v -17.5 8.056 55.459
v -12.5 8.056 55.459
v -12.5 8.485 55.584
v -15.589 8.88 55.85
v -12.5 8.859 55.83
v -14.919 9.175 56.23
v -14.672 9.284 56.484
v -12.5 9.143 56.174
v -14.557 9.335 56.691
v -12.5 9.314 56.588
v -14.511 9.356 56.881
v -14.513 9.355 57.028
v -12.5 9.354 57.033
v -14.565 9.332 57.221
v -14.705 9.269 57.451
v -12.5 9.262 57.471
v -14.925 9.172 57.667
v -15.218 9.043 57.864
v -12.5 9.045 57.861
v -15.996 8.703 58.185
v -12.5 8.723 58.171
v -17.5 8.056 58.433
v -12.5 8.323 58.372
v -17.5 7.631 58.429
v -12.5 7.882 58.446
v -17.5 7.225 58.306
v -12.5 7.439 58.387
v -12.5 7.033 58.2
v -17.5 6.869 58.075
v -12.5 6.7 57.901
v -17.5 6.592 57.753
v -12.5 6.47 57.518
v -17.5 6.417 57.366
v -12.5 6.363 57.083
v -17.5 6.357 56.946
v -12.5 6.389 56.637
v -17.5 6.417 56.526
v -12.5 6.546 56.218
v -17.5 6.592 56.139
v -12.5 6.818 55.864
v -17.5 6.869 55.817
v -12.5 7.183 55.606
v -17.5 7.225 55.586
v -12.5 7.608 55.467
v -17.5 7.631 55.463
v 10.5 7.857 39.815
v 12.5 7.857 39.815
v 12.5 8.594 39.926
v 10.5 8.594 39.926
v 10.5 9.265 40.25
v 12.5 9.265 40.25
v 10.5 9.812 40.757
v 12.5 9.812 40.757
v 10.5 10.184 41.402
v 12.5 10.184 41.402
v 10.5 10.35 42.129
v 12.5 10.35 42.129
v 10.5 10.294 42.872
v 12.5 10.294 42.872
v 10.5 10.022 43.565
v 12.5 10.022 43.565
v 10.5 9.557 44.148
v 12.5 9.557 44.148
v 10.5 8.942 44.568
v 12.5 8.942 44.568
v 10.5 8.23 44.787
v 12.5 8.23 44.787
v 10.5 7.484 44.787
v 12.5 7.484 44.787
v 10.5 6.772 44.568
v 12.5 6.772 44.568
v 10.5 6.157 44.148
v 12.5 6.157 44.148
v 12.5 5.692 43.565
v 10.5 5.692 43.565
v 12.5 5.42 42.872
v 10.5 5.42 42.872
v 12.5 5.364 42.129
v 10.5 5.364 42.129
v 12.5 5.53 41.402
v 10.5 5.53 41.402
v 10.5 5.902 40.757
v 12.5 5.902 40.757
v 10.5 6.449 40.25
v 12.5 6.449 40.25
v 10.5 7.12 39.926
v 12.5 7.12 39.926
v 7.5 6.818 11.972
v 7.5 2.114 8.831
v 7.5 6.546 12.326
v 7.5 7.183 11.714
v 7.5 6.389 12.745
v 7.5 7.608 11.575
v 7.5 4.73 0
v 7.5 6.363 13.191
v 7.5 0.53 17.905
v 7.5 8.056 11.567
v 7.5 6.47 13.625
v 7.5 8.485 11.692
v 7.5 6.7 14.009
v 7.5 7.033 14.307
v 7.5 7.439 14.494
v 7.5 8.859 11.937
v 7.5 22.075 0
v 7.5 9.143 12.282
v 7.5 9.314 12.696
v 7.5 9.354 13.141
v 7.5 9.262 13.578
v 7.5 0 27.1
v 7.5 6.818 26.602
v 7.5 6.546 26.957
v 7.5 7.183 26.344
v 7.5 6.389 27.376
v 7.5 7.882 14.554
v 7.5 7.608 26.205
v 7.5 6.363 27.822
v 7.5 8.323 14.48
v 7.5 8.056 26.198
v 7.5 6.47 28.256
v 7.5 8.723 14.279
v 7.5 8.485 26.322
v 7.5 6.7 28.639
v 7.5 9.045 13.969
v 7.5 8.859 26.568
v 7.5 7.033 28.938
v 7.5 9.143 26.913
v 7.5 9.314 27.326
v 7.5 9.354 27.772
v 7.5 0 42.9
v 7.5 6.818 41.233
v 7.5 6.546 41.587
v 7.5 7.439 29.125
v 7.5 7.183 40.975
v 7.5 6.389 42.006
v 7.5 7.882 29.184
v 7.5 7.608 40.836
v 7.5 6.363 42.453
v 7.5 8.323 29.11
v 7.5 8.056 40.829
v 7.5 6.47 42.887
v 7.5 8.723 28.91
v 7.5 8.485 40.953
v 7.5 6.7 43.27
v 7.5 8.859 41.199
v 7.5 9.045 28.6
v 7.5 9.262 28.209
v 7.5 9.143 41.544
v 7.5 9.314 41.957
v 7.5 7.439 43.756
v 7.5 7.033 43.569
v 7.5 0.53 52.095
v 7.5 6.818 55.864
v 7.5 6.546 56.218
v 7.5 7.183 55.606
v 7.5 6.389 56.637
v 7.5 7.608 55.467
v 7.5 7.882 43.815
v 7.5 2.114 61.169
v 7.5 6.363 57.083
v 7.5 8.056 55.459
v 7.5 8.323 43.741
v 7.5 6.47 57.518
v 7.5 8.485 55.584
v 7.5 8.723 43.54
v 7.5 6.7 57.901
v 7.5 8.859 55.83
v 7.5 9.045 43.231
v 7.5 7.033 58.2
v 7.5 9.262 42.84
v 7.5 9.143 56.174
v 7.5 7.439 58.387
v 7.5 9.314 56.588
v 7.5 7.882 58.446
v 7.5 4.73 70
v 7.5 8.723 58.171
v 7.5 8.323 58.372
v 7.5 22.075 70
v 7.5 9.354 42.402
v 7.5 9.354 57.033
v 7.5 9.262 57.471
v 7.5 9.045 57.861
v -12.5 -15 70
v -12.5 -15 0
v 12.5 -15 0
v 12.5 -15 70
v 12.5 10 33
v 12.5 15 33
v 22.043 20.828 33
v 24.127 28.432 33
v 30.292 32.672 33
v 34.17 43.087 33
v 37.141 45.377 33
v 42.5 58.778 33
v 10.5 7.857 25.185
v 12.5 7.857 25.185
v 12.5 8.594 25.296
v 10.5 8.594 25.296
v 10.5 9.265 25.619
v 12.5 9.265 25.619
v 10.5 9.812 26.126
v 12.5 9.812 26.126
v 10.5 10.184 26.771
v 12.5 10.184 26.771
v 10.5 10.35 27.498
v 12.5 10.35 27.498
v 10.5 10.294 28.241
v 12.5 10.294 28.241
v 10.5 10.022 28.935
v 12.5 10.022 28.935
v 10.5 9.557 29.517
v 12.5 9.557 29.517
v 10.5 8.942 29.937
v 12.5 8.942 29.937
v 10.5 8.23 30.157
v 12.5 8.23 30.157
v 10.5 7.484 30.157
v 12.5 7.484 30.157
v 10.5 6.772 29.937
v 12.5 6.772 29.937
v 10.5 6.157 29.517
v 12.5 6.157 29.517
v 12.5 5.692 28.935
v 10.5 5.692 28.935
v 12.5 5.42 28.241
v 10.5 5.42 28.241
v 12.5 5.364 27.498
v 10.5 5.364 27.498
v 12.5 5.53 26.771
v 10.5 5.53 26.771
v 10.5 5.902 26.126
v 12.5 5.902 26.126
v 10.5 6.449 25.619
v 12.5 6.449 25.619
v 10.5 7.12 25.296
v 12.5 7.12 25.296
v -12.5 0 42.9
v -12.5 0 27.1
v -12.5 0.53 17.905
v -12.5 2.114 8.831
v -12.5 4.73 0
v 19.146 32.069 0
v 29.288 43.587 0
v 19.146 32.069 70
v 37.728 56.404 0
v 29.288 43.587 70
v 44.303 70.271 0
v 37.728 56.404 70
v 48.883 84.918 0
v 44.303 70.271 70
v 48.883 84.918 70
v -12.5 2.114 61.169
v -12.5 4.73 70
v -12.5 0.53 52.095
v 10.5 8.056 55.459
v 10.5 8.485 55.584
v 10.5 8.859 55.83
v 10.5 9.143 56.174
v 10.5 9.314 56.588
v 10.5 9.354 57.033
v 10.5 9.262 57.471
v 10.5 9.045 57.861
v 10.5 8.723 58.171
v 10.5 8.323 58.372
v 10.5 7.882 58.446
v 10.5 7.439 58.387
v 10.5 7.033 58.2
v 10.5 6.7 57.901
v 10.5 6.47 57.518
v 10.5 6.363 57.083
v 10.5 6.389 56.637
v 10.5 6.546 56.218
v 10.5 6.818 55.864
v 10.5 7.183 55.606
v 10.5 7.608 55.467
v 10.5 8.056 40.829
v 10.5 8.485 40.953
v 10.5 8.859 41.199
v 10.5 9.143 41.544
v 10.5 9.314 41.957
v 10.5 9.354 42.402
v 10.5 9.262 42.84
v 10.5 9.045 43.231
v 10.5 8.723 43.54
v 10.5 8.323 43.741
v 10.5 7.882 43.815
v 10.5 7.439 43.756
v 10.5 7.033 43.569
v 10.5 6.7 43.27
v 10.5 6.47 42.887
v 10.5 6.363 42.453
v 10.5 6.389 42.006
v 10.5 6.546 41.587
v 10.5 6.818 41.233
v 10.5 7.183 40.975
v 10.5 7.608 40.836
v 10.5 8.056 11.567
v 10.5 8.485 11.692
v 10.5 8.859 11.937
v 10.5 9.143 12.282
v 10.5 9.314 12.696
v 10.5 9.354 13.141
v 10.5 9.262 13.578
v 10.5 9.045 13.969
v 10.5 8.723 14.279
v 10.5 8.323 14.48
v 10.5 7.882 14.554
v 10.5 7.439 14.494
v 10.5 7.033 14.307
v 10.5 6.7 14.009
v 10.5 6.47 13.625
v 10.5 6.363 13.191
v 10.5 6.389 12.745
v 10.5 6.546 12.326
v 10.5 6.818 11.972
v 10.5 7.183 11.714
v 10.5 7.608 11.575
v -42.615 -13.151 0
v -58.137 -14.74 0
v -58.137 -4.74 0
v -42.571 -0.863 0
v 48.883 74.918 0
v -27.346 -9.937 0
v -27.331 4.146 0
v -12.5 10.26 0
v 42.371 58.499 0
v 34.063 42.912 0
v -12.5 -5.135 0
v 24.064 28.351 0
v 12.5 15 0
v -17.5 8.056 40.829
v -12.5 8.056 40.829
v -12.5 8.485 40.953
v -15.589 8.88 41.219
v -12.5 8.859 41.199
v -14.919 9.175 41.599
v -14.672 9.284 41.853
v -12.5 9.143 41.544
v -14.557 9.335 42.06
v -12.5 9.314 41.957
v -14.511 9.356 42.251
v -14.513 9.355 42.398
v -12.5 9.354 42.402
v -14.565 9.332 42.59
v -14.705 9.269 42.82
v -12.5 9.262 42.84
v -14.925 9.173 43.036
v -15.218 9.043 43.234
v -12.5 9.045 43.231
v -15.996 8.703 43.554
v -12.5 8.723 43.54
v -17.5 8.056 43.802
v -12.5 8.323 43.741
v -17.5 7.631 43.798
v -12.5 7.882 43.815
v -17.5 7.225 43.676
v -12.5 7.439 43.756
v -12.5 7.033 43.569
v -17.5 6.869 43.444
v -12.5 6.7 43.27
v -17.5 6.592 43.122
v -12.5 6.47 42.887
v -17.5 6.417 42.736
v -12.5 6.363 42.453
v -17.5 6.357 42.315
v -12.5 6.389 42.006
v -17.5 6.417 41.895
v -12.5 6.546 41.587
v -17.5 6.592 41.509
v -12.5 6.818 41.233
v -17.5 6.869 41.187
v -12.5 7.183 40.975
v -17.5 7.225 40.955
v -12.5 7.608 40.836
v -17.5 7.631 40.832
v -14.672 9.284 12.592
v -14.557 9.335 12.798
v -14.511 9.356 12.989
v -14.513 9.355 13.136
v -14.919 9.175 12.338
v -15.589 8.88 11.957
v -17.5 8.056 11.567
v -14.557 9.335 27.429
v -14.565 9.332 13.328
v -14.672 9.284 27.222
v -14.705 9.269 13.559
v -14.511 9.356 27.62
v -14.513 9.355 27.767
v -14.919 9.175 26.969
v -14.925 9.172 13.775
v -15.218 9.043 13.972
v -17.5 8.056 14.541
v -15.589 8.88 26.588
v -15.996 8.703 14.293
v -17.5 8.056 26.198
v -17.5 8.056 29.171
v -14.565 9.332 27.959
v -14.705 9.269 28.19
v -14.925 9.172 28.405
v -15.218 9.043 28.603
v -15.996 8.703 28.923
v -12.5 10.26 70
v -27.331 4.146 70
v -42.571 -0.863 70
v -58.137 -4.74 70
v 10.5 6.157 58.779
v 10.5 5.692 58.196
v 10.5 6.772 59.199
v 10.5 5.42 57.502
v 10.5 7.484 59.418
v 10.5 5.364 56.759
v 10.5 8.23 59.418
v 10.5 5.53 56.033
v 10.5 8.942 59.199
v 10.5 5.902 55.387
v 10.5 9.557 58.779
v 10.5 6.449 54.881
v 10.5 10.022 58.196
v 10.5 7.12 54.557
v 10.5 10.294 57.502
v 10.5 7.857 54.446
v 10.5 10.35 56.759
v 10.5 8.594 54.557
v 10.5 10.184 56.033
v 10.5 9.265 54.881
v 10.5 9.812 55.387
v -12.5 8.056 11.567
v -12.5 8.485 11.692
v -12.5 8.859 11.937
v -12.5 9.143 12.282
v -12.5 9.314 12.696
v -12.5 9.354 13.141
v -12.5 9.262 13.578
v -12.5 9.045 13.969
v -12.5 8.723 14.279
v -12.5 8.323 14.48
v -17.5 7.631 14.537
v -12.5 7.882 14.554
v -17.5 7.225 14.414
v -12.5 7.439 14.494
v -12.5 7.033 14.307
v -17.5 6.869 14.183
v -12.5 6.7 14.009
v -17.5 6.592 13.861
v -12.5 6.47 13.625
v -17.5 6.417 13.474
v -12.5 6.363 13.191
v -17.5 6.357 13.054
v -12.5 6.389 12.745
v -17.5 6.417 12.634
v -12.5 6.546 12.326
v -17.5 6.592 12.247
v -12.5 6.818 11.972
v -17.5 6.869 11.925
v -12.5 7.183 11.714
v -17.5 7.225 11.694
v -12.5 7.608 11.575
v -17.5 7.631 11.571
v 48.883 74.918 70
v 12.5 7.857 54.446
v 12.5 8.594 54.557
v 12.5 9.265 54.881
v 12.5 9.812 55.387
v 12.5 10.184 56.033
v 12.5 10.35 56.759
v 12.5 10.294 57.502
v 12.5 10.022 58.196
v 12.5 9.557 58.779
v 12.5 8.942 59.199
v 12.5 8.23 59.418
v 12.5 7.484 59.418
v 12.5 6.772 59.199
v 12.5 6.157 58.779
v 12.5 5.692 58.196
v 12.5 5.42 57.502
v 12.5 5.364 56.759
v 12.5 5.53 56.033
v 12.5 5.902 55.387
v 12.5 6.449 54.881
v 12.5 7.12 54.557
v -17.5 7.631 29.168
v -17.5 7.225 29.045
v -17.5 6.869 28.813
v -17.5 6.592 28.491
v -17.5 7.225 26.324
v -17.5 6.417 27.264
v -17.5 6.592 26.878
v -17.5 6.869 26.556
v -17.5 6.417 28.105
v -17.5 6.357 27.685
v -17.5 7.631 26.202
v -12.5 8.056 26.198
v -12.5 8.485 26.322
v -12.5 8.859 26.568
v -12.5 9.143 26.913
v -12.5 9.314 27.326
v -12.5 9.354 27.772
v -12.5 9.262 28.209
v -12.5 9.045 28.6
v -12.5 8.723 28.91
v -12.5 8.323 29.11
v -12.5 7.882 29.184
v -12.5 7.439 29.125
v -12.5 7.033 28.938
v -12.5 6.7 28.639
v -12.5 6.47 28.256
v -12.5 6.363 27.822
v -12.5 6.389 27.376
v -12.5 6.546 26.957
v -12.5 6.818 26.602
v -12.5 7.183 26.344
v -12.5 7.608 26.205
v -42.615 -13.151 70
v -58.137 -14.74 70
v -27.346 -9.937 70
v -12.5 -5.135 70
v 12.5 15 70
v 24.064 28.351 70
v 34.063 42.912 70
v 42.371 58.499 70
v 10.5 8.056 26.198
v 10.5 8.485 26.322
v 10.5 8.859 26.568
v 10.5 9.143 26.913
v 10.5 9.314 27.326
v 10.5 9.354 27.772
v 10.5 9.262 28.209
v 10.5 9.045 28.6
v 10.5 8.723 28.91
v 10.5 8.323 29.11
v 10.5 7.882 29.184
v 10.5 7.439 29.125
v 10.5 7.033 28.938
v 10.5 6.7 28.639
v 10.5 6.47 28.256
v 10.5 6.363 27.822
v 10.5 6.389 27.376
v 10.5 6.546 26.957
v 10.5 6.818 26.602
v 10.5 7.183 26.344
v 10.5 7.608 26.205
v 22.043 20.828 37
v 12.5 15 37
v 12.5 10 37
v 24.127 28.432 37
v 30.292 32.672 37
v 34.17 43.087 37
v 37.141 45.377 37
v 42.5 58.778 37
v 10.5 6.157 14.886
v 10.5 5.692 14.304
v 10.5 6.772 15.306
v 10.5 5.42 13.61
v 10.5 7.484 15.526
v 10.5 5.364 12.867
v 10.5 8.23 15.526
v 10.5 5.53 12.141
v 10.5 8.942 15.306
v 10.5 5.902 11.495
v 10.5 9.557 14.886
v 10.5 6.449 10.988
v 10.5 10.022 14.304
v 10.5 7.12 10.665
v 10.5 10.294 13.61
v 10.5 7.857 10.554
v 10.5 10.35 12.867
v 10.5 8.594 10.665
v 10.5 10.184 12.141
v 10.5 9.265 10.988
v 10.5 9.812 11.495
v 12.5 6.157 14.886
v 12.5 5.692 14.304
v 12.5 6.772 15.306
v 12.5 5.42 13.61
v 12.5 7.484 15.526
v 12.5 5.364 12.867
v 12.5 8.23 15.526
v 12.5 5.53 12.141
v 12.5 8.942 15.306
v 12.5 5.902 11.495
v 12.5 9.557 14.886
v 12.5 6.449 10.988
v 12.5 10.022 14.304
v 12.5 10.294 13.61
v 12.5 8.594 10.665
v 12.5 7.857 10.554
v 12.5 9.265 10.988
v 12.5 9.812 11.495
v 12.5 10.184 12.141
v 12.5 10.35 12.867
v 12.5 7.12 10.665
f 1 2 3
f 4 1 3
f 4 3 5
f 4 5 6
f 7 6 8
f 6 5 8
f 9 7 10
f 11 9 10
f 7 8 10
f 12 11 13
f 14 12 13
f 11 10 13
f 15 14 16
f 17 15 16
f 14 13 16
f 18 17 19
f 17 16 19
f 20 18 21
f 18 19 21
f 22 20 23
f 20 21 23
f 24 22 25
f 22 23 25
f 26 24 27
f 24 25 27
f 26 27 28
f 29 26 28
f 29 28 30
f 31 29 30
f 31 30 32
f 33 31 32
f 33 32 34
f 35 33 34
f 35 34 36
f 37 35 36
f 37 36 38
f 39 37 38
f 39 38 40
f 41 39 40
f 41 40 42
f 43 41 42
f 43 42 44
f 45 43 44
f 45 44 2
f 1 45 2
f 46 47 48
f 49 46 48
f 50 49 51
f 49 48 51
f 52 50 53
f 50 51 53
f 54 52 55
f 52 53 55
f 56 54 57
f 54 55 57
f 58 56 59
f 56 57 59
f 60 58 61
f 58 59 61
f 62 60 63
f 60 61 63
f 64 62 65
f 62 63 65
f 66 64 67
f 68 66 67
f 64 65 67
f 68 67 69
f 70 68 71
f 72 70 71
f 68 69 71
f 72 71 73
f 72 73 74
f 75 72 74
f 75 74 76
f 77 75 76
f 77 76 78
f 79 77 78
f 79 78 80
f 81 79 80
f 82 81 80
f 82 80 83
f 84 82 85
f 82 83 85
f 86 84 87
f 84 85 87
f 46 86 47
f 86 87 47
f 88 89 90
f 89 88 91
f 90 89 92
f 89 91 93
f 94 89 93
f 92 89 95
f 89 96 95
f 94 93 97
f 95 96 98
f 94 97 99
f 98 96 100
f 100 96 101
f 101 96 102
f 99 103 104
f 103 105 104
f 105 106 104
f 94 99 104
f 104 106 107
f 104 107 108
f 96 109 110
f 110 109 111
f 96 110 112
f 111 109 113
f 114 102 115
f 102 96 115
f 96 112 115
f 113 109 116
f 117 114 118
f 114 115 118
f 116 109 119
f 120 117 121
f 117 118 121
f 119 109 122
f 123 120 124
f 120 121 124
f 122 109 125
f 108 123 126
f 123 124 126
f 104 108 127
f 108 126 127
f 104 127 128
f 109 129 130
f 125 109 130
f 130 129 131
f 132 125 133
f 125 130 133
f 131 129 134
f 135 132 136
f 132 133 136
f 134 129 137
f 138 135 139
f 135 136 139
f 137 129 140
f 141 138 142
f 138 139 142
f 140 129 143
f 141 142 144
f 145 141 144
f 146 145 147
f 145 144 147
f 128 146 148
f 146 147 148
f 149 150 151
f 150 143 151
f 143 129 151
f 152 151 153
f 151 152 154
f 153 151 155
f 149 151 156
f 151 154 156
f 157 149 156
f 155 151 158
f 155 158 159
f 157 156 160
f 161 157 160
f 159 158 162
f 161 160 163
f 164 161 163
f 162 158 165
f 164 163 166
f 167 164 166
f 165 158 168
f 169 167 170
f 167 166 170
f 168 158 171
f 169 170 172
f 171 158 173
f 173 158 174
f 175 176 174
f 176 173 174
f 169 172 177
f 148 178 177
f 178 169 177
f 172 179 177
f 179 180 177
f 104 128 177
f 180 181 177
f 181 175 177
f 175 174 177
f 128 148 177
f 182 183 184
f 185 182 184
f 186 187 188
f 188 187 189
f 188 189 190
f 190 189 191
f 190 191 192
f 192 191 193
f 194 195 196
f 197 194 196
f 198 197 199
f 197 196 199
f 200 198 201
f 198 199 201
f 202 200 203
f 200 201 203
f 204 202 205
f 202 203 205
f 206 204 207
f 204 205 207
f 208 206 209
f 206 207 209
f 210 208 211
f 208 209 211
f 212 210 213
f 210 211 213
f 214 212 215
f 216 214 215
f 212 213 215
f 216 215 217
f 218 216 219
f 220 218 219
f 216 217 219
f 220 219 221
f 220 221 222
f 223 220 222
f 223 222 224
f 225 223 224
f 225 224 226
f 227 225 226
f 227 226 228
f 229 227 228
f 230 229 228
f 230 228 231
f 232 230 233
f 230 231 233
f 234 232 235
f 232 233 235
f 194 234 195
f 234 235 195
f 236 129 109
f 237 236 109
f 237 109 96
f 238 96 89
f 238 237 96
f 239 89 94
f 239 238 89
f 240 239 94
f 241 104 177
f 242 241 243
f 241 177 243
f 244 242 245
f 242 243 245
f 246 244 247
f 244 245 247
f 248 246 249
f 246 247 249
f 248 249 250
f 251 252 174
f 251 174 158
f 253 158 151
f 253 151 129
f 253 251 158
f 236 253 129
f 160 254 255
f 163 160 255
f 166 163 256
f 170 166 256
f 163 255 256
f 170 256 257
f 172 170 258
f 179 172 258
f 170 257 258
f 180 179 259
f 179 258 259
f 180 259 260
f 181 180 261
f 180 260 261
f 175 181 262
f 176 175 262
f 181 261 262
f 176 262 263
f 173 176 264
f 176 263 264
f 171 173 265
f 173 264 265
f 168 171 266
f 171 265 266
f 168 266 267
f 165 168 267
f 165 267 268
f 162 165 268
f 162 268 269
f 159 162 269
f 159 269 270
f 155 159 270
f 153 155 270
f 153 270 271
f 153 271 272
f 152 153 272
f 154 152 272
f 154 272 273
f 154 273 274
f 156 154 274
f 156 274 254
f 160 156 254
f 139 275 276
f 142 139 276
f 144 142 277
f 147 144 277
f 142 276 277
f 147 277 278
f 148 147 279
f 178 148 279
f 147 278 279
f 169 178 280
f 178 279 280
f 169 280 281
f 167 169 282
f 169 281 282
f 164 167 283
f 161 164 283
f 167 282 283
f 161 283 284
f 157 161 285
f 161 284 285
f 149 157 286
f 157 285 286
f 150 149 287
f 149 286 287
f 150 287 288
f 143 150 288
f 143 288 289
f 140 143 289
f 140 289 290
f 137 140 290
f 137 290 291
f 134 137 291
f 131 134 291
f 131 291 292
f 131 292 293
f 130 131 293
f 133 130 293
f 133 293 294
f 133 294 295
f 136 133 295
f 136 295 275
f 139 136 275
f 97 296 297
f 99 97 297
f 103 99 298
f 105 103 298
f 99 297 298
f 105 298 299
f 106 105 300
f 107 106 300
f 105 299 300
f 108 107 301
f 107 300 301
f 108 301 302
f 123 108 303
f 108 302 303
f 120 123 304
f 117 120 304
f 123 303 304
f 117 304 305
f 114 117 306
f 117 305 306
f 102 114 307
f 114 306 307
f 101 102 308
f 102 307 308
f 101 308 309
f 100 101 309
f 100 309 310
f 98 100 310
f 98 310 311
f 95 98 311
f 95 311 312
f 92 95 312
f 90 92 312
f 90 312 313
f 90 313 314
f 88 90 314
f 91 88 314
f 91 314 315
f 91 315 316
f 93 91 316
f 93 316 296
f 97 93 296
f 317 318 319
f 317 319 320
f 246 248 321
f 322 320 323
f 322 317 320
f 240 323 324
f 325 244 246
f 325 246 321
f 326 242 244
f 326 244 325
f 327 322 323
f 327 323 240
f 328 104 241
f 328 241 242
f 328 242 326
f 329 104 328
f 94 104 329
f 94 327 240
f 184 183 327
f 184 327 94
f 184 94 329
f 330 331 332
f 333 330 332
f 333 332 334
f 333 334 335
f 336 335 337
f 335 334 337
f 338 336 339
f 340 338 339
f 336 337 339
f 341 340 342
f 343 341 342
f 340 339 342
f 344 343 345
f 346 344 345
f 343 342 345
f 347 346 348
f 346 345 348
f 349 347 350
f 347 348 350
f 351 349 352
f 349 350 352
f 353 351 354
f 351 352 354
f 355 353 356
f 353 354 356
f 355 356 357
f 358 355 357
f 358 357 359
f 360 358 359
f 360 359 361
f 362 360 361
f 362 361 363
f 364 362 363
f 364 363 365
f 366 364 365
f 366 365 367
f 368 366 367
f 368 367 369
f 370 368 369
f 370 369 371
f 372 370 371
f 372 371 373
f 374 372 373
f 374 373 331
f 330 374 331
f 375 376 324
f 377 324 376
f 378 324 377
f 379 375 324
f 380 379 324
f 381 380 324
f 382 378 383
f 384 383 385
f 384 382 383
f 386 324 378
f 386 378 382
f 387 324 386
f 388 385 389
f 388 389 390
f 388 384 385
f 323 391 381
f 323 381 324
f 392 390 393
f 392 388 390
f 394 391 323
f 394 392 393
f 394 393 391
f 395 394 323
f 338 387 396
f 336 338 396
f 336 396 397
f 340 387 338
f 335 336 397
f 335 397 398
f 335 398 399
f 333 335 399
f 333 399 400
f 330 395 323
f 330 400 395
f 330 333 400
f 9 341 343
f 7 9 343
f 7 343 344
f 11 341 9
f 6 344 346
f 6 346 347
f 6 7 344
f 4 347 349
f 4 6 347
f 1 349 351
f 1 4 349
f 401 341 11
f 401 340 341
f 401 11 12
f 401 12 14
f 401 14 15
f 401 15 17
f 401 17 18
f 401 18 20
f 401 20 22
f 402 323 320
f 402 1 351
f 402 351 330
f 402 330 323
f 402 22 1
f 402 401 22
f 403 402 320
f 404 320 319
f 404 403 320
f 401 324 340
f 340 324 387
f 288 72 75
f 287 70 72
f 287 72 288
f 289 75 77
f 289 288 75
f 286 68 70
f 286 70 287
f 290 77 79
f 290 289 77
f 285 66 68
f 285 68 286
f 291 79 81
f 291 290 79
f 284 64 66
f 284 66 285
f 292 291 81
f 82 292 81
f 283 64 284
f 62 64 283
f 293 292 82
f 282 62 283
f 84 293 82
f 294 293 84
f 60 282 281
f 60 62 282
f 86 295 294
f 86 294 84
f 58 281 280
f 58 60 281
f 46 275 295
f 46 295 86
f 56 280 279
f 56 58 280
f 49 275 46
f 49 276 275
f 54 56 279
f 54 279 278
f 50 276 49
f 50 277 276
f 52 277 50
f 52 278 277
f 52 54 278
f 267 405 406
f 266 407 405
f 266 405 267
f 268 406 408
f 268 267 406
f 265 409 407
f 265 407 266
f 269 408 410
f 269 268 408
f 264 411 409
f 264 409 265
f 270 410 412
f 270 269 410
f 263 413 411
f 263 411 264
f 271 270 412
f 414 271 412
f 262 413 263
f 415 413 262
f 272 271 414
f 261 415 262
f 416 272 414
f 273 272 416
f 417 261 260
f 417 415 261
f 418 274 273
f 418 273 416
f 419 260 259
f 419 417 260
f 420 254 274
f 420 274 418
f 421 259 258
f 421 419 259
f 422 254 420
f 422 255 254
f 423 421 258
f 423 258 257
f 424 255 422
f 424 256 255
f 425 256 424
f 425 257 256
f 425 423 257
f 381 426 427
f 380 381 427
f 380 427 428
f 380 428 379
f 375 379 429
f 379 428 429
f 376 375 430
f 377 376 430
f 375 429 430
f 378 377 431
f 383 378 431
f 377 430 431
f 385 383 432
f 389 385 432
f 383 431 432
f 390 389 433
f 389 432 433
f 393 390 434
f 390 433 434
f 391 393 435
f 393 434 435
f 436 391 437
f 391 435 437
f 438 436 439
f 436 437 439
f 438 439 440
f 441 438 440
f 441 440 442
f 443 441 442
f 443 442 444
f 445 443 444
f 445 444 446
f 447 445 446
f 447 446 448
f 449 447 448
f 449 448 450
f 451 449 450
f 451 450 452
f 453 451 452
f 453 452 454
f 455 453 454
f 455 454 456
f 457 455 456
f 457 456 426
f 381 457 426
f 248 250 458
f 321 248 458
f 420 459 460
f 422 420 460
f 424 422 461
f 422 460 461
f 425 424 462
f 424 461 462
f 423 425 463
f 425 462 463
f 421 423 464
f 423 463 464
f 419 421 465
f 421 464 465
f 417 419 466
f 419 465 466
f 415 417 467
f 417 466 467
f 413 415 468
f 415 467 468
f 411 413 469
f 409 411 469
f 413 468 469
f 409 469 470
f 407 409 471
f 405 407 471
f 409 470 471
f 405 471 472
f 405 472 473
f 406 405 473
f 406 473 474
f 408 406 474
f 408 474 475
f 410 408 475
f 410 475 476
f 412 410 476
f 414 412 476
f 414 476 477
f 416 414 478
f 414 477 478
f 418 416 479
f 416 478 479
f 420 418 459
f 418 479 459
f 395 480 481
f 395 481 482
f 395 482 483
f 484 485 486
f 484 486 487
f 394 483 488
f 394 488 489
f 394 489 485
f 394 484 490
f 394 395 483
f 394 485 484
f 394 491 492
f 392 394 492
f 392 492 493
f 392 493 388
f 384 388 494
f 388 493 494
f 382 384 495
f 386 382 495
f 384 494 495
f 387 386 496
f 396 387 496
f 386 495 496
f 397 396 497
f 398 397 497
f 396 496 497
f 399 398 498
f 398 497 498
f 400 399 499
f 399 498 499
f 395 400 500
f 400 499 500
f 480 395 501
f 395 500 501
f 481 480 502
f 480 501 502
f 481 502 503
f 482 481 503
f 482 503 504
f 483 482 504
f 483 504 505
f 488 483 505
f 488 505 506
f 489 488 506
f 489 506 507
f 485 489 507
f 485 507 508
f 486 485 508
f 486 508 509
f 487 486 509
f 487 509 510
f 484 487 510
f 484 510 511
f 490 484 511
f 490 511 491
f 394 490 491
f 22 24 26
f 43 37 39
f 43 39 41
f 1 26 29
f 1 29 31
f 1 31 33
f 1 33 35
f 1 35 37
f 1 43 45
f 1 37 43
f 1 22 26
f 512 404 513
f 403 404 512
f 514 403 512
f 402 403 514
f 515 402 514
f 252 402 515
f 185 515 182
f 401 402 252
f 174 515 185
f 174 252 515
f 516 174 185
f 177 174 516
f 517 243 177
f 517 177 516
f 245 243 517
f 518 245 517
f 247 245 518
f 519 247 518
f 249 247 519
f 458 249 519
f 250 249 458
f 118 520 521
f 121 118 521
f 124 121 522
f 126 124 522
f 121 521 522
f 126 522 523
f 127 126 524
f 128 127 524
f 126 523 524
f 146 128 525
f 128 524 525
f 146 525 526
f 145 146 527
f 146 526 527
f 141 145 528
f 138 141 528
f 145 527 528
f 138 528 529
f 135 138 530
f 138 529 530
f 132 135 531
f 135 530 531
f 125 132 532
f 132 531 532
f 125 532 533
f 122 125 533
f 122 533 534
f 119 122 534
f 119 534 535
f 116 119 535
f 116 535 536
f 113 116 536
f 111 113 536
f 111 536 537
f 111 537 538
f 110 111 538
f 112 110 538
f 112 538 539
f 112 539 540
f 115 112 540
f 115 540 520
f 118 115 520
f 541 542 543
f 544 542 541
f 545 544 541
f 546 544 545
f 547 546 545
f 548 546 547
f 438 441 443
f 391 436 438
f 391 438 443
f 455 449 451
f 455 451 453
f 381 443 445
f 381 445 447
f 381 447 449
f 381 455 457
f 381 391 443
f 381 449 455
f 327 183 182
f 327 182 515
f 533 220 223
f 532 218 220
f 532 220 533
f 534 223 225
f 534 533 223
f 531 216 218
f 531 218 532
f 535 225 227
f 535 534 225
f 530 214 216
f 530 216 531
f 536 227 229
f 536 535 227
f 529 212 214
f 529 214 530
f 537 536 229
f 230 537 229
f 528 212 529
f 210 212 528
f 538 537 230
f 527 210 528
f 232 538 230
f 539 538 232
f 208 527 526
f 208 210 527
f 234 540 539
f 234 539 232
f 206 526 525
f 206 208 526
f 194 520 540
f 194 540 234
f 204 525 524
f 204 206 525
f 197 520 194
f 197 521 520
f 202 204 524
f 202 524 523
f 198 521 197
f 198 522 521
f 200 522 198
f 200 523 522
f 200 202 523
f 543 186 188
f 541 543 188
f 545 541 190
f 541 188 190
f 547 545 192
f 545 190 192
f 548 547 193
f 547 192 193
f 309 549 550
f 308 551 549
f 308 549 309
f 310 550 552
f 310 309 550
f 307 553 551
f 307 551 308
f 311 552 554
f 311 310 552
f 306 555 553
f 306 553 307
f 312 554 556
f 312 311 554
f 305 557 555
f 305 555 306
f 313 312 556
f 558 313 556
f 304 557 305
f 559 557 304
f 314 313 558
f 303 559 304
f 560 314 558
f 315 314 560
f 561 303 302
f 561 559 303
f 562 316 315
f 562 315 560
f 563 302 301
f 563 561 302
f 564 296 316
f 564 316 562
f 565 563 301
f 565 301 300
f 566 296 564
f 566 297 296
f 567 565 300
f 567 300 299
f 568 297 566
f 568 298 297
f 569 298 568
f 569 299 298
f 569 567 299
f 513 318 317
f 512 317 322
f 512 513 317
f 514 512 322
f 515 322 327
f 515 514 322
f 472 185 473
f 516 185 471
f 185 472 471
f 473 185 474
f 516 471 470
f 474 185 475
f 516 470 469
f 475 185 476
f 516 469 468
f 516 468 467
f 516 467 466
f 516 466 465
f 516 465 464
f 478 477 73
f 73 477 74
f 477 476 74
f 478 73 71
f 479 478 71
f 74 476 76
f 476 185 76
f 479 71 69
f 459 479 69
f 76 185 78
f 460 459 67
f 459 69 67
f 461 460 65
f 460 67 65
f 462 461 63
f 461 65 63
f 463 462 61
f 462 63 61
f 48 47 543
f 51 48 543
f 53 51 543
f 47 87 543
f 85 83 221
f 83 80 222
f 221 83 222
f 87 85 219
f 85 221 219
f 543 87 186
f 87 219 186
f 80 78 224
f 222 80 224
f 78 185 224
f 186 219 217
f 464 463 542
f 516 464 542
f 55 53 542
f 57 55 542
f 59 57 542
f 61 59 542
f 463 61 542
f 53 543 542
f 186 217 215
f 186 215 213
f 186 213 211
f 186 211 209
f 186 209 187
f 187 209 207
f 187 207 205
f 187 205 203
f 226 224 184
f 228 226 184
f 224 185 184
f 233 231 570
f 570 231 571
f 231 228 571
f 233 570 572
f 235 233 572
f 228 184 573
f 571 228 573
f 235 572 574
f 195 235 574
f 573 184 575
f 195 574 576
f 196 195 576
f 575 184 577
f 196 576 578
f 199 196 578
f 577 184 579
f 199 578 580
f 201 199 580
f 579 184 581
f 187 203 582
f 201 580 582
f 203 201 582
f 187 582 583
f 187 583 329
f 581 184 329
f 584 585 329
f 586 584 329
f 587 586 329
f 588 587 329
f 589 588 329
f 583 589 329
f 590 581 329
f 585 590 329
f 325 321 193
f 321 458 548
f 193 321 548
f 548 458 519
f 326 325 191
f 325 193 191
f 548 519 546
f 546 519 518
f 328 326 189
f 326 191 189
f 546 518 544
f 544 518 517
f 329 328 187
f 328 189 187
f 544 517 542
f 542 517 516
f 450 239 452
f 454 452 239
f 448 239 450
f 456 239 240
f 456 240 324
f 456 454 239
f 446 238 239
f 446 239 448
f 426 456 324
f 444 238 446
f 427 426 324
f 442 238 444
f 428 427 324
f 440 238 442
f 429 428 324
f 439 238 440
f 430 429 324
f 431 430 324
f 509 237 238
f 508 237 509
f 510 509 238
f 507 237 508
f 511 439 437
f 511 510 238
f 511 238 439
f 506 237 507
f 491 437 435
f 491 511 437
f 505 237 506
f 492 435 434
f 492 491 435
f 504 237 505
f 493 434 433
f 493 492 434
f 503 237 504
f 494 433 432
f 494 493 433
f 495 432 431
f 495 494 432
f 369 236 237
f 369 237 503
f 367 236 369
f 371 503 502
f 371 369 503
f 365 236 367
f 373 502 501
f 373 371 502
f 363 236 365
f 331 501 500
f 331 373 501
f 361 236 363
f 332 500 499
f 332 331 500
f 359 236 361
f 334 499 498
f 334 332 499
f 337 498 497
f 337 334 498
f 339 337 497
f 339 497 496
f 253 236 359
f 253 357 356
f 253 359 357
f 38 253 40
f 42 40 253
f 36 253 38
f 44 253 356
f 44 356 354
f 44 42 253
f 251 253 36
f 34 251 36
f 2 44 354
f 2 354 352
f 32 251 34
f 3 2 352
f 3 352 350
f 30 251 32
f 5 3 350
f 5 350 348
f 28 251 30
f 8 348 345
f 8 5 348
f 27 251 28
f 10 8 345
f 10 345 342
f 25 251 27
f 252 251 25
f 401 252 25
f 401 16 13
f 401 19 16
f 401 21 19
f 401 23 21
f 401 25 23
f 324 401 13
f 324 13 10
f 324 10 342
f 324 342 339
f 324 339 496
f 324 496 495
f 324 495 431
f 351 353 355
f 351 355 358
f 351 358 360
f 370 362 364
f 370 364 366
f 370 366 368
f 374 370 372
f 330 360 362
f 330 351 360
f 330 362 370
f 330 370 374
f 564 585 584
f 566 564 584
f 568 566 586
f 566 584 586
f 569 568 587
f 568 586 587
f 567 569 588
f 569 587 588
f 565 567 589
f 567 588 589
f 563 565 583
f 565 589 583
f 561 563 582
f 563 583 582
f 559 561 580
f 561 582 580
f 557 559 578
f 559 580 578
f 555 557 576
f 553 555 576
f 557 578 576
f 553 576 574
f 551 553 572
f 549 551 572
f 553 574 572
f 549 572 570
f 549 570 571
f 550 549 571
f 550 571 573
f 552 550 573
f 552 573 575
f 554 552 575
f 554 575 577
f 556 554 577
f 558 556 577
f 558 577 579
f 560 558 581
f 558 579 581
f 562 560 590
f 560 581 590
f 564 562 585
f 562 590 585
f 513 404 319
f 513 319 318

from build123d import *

# Parameters (mm, degrees)
SKETCH_1_W                  = 25
SKETCH_1_H                  = 30
EXTRUDE_1_DEPTH             = 70
CUT_EXTRUDE_1_DEPTH         = 7.5
CUT_EXTRUDE_1_DEPTH_BACK    = 20
EXTRUDE_2_REACH             = 42.078
EXTRUDE_2_DIRECTION_2_REACH = 42.078
EXTRUDE_3_DEPTH             = 2
EXTRUDE_3_DEPTH_BACK        = 2
EXTRUDE_4_REACH             = 106.046
EXTRUDE_4_DIRECTION_2_REACH = 106.046
SKETCH_7_R                  = 1.5
CUT_EXTRUDE_2_DEPTH         = 30
SKETCH_8_R                  = 2.5
CUT_EXTRUDE_3_DEPTH         = 2


with BuildPart() as part:
    # 草图1 → 凸台-拉伸1 (new body)
    with BuildSketch(Plane.XY):
        Rectangle(SKETCH_1_W, SKETCH_1_H)
    extrude(amount=EXTRUDE_1_DEPTH)

    # 草图2 → 切除-拉伸1 (cut, two sides: drawn at the far end of the back side and taken through both)
    with BuildSketch(Plane(origin=(0, 0, 0), x_dir=(0, 0, -1), z_dir=(1, 0, 0)).offset(-CUT_EXTRUDE_1_DEPTH_BACK)):
        with BuildLine():
            Line((-42.9, 0), (-27.1, 0))
            ThreePointArc((-27.1, 0), (-2.605102572, 3.842268941), (19.536895265, 15))
            Line((19.536895265, 15), (-89.536895265, 15))
            ThreePointArc((-89.536895265, 15), (-67.394897428, 3.842268941), (-42.9, 0))
        make_face()
    extrude(amount=CUT_EXTRUDE_1_DEPTH + CUT_EXTRUDE_1_DEPTH_BACK, mode=Mode.SUBTRACT)

    # 凸台-拉伸2: up to this face of the body (flat: up to its plane)
    extrude_2_end = Plane(part.part.faces().sort_by_distance((0.942908229, -3.720694452, 70))[0])
    # 草图4 → 凸台-拉伸2 (add, up to the picked face)
    with BuildSketch(Plane.XY.offset(35), mode=Mode.PRIVATE) as extrude_2_sk1:
        with BuildLine():
            Line((48.883360942, 84.917683668), (48.883360942, 74.917683668))
            ThreePointArc((48.883360942, 74.917683668), (34.063250103, 42.911549159), (12.5, 15))
            Line((12.5, 15), (7.5, 15))
            Line((7.5, 15), (7.5, 22.075485157))
            ThreePointArc((7.5, 22.075485157), (33.732068033, 49.84808287), (48.883360942, 84.917683668))
        make_face()
    extrude_2_tool1 = split(extrude(extrude_2_sk1.sketch, amount=EXTRUDE_2_REACH, mode=Mode.PRIVATE), bisect_by=extrude_2_end, keep=Keep.BOTH, mode=Mode.PRIVATE)
    add(extrude_2_tool1.solids().sort_by(Axis((27.062711, 39.609343, 35), (0, 0, 1)))[0])

    # 凸台-拉伸2 direction 2: up to this face of the body (flat: up to its plane)
    extrude_2_direction_2_end = Plane(part.part.faces().sort_by_distance((0.942908229, -3.720694452, 0))[0])
    # 草图4 → 凸台-拉伸2 direction 2 (add, up to the picked face)
    with BuildSketch(Plane.XY.offset(35), mode=Mode.PRIVATE) as extrude_2_direction_2_sk1:
        with BuildLine():
            Line((48.883360942, 84.917683668), (48.883360942, 74.917683668))
            ThreePointArc((48.883360942, 74.917683668), (34.063250103, 42.911549159), (12.5, 15))
            Line((12.5, 15), (7.5, 15))
            Line((7.5, 15), (7.5, 22.075485157))
            ThreePointArc((7.5, 22.075485157), (33.732068033, 49.84808287), (48.883360942, 84.917683668))
        make_face()
    extrude_2_direction_2_tool1 = split(extrude(extrude_2_direction_2_sk1.sketch, amount=-EXTRUDE_2_DIRECTION_2_REACH, mode=Mode.PRIVATE), bisect_by=extrude_2_direction_2_end, keep=Keep.BOTH, mode=Mode.PRIVATE)
    add(extrude_2_direction_2_tool1.solids().sort_by(Axis((27.062711, 39.609343, 35), (0, 0, -1)))[0])

    # 草图5 → 凸台-拉伸3 (add, two sides: drawn at the far end of the back side and taken through both)
    with BuildSketch(Plane.XY.offset(35).offset(-EXTRUDE_3_DEPTH_BACK)):
        with BuildLine():
            Line((12.5, 15), (12.5, 10))
            ThreePointArc((12.5, 10), (30.292370974, 32.671790499), (42.5, 58.778347968))
            ThreePointArc((42.5, 58.778347968), (29.354915832, 35.618055325), (12.5, 15))
        make_face()
    extrude(amount=EXTRUDE_3_DEPTH + EXTRUDE_3_DEPTH_BACK)

    # 凸台-拉伸4: up to this face of the body (flat: up to its plane)
    extrude_4_end = Plane(part.part.faces().sort_by_distance((11.216595333, 13.322284496, 70))[0])
    # 草图6 → 凸台-拉伸4 (add, up to the picked face)
    with BuildSketch(Plane.XY.offset(35), mode=Mode.PRIVATE) as extrude_4_sk1:
        with BuildLine():
            Line((-58.137080228, -4.739738071), (-58.137080228, -14.739738071))
            ThreePointArc((-58.137080228, -14.739738071), (-34.938048555, -11.745320394), (-12.5, -5.135056795))
            Line((-12.5, -5.135056795), (-12.5, 10.260261929))
            ThreePointArc((-12.5, 10.260261929), (-34.904657371, 1.501035264), (-58.137080228, -4.739738071))
        make_face()
    extrude_4_tool1 = split(extrude(extrude_4_sk1.sketch, amount=EXTRUDE_4_REACH, mode=Mode.PRIVATE), bisect_by=extrude_4_end, keep=Keep.BOTH, mode=Mode.PRIVATE)
    add(extrude_4_tool1.solids().sort_by(Axis((-33.740556, -4.265759, 35), (0, 0, 1)))[0])

    # 凸台-拉伸4 direction 2: up to this face of the body (flat: up to its plane)
    extrude_4_direction_2_end = Plane(part.part.faces().sort_by_distance((11.216595333, 13.322284496, 0))[0])
    # 草图6 → 凸台-拉伸4 direction 2 (add, up to the picked face)
    with BuildSketch(Plane.XY.offset(35), mode=Mode.PRIVATE) as extrude_4_direction_2_sk1:
        with BuildLine():
            Line((-58.137080228, -4.739738071), (-58.137080228, -14.739738071))
            ThreePointArc((-58.137080228, -14.739738071), (-34.938048555, -11.745320394), (-12.5, -5.135056795))
            Line((-12.5, -5.135056795), (-12.5, 10.260261929))
            ThreePointArc((-12.5, 10.260261929), (-34.904657371, 1.501035264), (-58.137080228, -4.739738071))
        make_face()
    extrude_4_direction_2_tool1 = split(extrude(extrude_4_direction_2_sk1.sketch, amount=-EXTRUDE_4_DIRECTION_2_REACH, mode=Mode.PRIVATE), bisect_by=extrude_4_direction_2_end, keep=Keep.BOTH, mode=Mode.PRIVATE)
    add(extrude_4_direction_2_tool1.solids().sort_by(Axis((-33.740556, -4.265759, 35), (0, 0, -1)))[0])

    # 草图7 → 切除-拉伸2 (cut)
    with BuildSketch(Plane(origin=(12.5, 0, 0), x_dir=(0, 0, -1), z_dir=(1, 0, 0))):
        with Locations(Location((-27.684621138, 7.856985716, 0), (0, 0, 7.606747505))):
            Circle(SKETCH_7_R)
        with Locations(Location((-42.315378862, 7.856985716, 0), (0, 0, 7.606747505))):
            Circle(SKETCH_7_R)
        with Locations(Location((-56.946136586, 7.856985716, 0), (0, 0, 7.606747505))):
            Circle(SKETCH_7_R)
        with Locations(Location((-13.053863414, 7.856985716, 0), (0, 0, 7.606747505))):
            Circle(SKETCH_7_R)
    extrude(amount=-CUT_EXTRUDE_2_DEPTH, mode=Mode.SUBTRACT)

    # 草图8 → 切除-拉伸3 (cut)
    with BuildSketch(Plane(origin=(12.5, 0, 0), x_dir=(0, 0, -1), z_dir=(1, 0, 0))):
        with Locations((-56.946136586, 7.856985716)):
            Circle(SKETCH_8_R)
        with Locations((-42.315378862, 7.856985716)):
            Circle(SKETCH_8_R)
        with Locations((-27.684621138, 7.856985716)):
            Circle(SKETCH_8_R)
        with Locations((-13.053863414, 7.856985716)):
            Circle(SKETCH_8_R)
    extrude(amount=-CUT_EXTRUDE_3_DEPTH, mode=Mode.SUBTRACT)


solid = part.part
